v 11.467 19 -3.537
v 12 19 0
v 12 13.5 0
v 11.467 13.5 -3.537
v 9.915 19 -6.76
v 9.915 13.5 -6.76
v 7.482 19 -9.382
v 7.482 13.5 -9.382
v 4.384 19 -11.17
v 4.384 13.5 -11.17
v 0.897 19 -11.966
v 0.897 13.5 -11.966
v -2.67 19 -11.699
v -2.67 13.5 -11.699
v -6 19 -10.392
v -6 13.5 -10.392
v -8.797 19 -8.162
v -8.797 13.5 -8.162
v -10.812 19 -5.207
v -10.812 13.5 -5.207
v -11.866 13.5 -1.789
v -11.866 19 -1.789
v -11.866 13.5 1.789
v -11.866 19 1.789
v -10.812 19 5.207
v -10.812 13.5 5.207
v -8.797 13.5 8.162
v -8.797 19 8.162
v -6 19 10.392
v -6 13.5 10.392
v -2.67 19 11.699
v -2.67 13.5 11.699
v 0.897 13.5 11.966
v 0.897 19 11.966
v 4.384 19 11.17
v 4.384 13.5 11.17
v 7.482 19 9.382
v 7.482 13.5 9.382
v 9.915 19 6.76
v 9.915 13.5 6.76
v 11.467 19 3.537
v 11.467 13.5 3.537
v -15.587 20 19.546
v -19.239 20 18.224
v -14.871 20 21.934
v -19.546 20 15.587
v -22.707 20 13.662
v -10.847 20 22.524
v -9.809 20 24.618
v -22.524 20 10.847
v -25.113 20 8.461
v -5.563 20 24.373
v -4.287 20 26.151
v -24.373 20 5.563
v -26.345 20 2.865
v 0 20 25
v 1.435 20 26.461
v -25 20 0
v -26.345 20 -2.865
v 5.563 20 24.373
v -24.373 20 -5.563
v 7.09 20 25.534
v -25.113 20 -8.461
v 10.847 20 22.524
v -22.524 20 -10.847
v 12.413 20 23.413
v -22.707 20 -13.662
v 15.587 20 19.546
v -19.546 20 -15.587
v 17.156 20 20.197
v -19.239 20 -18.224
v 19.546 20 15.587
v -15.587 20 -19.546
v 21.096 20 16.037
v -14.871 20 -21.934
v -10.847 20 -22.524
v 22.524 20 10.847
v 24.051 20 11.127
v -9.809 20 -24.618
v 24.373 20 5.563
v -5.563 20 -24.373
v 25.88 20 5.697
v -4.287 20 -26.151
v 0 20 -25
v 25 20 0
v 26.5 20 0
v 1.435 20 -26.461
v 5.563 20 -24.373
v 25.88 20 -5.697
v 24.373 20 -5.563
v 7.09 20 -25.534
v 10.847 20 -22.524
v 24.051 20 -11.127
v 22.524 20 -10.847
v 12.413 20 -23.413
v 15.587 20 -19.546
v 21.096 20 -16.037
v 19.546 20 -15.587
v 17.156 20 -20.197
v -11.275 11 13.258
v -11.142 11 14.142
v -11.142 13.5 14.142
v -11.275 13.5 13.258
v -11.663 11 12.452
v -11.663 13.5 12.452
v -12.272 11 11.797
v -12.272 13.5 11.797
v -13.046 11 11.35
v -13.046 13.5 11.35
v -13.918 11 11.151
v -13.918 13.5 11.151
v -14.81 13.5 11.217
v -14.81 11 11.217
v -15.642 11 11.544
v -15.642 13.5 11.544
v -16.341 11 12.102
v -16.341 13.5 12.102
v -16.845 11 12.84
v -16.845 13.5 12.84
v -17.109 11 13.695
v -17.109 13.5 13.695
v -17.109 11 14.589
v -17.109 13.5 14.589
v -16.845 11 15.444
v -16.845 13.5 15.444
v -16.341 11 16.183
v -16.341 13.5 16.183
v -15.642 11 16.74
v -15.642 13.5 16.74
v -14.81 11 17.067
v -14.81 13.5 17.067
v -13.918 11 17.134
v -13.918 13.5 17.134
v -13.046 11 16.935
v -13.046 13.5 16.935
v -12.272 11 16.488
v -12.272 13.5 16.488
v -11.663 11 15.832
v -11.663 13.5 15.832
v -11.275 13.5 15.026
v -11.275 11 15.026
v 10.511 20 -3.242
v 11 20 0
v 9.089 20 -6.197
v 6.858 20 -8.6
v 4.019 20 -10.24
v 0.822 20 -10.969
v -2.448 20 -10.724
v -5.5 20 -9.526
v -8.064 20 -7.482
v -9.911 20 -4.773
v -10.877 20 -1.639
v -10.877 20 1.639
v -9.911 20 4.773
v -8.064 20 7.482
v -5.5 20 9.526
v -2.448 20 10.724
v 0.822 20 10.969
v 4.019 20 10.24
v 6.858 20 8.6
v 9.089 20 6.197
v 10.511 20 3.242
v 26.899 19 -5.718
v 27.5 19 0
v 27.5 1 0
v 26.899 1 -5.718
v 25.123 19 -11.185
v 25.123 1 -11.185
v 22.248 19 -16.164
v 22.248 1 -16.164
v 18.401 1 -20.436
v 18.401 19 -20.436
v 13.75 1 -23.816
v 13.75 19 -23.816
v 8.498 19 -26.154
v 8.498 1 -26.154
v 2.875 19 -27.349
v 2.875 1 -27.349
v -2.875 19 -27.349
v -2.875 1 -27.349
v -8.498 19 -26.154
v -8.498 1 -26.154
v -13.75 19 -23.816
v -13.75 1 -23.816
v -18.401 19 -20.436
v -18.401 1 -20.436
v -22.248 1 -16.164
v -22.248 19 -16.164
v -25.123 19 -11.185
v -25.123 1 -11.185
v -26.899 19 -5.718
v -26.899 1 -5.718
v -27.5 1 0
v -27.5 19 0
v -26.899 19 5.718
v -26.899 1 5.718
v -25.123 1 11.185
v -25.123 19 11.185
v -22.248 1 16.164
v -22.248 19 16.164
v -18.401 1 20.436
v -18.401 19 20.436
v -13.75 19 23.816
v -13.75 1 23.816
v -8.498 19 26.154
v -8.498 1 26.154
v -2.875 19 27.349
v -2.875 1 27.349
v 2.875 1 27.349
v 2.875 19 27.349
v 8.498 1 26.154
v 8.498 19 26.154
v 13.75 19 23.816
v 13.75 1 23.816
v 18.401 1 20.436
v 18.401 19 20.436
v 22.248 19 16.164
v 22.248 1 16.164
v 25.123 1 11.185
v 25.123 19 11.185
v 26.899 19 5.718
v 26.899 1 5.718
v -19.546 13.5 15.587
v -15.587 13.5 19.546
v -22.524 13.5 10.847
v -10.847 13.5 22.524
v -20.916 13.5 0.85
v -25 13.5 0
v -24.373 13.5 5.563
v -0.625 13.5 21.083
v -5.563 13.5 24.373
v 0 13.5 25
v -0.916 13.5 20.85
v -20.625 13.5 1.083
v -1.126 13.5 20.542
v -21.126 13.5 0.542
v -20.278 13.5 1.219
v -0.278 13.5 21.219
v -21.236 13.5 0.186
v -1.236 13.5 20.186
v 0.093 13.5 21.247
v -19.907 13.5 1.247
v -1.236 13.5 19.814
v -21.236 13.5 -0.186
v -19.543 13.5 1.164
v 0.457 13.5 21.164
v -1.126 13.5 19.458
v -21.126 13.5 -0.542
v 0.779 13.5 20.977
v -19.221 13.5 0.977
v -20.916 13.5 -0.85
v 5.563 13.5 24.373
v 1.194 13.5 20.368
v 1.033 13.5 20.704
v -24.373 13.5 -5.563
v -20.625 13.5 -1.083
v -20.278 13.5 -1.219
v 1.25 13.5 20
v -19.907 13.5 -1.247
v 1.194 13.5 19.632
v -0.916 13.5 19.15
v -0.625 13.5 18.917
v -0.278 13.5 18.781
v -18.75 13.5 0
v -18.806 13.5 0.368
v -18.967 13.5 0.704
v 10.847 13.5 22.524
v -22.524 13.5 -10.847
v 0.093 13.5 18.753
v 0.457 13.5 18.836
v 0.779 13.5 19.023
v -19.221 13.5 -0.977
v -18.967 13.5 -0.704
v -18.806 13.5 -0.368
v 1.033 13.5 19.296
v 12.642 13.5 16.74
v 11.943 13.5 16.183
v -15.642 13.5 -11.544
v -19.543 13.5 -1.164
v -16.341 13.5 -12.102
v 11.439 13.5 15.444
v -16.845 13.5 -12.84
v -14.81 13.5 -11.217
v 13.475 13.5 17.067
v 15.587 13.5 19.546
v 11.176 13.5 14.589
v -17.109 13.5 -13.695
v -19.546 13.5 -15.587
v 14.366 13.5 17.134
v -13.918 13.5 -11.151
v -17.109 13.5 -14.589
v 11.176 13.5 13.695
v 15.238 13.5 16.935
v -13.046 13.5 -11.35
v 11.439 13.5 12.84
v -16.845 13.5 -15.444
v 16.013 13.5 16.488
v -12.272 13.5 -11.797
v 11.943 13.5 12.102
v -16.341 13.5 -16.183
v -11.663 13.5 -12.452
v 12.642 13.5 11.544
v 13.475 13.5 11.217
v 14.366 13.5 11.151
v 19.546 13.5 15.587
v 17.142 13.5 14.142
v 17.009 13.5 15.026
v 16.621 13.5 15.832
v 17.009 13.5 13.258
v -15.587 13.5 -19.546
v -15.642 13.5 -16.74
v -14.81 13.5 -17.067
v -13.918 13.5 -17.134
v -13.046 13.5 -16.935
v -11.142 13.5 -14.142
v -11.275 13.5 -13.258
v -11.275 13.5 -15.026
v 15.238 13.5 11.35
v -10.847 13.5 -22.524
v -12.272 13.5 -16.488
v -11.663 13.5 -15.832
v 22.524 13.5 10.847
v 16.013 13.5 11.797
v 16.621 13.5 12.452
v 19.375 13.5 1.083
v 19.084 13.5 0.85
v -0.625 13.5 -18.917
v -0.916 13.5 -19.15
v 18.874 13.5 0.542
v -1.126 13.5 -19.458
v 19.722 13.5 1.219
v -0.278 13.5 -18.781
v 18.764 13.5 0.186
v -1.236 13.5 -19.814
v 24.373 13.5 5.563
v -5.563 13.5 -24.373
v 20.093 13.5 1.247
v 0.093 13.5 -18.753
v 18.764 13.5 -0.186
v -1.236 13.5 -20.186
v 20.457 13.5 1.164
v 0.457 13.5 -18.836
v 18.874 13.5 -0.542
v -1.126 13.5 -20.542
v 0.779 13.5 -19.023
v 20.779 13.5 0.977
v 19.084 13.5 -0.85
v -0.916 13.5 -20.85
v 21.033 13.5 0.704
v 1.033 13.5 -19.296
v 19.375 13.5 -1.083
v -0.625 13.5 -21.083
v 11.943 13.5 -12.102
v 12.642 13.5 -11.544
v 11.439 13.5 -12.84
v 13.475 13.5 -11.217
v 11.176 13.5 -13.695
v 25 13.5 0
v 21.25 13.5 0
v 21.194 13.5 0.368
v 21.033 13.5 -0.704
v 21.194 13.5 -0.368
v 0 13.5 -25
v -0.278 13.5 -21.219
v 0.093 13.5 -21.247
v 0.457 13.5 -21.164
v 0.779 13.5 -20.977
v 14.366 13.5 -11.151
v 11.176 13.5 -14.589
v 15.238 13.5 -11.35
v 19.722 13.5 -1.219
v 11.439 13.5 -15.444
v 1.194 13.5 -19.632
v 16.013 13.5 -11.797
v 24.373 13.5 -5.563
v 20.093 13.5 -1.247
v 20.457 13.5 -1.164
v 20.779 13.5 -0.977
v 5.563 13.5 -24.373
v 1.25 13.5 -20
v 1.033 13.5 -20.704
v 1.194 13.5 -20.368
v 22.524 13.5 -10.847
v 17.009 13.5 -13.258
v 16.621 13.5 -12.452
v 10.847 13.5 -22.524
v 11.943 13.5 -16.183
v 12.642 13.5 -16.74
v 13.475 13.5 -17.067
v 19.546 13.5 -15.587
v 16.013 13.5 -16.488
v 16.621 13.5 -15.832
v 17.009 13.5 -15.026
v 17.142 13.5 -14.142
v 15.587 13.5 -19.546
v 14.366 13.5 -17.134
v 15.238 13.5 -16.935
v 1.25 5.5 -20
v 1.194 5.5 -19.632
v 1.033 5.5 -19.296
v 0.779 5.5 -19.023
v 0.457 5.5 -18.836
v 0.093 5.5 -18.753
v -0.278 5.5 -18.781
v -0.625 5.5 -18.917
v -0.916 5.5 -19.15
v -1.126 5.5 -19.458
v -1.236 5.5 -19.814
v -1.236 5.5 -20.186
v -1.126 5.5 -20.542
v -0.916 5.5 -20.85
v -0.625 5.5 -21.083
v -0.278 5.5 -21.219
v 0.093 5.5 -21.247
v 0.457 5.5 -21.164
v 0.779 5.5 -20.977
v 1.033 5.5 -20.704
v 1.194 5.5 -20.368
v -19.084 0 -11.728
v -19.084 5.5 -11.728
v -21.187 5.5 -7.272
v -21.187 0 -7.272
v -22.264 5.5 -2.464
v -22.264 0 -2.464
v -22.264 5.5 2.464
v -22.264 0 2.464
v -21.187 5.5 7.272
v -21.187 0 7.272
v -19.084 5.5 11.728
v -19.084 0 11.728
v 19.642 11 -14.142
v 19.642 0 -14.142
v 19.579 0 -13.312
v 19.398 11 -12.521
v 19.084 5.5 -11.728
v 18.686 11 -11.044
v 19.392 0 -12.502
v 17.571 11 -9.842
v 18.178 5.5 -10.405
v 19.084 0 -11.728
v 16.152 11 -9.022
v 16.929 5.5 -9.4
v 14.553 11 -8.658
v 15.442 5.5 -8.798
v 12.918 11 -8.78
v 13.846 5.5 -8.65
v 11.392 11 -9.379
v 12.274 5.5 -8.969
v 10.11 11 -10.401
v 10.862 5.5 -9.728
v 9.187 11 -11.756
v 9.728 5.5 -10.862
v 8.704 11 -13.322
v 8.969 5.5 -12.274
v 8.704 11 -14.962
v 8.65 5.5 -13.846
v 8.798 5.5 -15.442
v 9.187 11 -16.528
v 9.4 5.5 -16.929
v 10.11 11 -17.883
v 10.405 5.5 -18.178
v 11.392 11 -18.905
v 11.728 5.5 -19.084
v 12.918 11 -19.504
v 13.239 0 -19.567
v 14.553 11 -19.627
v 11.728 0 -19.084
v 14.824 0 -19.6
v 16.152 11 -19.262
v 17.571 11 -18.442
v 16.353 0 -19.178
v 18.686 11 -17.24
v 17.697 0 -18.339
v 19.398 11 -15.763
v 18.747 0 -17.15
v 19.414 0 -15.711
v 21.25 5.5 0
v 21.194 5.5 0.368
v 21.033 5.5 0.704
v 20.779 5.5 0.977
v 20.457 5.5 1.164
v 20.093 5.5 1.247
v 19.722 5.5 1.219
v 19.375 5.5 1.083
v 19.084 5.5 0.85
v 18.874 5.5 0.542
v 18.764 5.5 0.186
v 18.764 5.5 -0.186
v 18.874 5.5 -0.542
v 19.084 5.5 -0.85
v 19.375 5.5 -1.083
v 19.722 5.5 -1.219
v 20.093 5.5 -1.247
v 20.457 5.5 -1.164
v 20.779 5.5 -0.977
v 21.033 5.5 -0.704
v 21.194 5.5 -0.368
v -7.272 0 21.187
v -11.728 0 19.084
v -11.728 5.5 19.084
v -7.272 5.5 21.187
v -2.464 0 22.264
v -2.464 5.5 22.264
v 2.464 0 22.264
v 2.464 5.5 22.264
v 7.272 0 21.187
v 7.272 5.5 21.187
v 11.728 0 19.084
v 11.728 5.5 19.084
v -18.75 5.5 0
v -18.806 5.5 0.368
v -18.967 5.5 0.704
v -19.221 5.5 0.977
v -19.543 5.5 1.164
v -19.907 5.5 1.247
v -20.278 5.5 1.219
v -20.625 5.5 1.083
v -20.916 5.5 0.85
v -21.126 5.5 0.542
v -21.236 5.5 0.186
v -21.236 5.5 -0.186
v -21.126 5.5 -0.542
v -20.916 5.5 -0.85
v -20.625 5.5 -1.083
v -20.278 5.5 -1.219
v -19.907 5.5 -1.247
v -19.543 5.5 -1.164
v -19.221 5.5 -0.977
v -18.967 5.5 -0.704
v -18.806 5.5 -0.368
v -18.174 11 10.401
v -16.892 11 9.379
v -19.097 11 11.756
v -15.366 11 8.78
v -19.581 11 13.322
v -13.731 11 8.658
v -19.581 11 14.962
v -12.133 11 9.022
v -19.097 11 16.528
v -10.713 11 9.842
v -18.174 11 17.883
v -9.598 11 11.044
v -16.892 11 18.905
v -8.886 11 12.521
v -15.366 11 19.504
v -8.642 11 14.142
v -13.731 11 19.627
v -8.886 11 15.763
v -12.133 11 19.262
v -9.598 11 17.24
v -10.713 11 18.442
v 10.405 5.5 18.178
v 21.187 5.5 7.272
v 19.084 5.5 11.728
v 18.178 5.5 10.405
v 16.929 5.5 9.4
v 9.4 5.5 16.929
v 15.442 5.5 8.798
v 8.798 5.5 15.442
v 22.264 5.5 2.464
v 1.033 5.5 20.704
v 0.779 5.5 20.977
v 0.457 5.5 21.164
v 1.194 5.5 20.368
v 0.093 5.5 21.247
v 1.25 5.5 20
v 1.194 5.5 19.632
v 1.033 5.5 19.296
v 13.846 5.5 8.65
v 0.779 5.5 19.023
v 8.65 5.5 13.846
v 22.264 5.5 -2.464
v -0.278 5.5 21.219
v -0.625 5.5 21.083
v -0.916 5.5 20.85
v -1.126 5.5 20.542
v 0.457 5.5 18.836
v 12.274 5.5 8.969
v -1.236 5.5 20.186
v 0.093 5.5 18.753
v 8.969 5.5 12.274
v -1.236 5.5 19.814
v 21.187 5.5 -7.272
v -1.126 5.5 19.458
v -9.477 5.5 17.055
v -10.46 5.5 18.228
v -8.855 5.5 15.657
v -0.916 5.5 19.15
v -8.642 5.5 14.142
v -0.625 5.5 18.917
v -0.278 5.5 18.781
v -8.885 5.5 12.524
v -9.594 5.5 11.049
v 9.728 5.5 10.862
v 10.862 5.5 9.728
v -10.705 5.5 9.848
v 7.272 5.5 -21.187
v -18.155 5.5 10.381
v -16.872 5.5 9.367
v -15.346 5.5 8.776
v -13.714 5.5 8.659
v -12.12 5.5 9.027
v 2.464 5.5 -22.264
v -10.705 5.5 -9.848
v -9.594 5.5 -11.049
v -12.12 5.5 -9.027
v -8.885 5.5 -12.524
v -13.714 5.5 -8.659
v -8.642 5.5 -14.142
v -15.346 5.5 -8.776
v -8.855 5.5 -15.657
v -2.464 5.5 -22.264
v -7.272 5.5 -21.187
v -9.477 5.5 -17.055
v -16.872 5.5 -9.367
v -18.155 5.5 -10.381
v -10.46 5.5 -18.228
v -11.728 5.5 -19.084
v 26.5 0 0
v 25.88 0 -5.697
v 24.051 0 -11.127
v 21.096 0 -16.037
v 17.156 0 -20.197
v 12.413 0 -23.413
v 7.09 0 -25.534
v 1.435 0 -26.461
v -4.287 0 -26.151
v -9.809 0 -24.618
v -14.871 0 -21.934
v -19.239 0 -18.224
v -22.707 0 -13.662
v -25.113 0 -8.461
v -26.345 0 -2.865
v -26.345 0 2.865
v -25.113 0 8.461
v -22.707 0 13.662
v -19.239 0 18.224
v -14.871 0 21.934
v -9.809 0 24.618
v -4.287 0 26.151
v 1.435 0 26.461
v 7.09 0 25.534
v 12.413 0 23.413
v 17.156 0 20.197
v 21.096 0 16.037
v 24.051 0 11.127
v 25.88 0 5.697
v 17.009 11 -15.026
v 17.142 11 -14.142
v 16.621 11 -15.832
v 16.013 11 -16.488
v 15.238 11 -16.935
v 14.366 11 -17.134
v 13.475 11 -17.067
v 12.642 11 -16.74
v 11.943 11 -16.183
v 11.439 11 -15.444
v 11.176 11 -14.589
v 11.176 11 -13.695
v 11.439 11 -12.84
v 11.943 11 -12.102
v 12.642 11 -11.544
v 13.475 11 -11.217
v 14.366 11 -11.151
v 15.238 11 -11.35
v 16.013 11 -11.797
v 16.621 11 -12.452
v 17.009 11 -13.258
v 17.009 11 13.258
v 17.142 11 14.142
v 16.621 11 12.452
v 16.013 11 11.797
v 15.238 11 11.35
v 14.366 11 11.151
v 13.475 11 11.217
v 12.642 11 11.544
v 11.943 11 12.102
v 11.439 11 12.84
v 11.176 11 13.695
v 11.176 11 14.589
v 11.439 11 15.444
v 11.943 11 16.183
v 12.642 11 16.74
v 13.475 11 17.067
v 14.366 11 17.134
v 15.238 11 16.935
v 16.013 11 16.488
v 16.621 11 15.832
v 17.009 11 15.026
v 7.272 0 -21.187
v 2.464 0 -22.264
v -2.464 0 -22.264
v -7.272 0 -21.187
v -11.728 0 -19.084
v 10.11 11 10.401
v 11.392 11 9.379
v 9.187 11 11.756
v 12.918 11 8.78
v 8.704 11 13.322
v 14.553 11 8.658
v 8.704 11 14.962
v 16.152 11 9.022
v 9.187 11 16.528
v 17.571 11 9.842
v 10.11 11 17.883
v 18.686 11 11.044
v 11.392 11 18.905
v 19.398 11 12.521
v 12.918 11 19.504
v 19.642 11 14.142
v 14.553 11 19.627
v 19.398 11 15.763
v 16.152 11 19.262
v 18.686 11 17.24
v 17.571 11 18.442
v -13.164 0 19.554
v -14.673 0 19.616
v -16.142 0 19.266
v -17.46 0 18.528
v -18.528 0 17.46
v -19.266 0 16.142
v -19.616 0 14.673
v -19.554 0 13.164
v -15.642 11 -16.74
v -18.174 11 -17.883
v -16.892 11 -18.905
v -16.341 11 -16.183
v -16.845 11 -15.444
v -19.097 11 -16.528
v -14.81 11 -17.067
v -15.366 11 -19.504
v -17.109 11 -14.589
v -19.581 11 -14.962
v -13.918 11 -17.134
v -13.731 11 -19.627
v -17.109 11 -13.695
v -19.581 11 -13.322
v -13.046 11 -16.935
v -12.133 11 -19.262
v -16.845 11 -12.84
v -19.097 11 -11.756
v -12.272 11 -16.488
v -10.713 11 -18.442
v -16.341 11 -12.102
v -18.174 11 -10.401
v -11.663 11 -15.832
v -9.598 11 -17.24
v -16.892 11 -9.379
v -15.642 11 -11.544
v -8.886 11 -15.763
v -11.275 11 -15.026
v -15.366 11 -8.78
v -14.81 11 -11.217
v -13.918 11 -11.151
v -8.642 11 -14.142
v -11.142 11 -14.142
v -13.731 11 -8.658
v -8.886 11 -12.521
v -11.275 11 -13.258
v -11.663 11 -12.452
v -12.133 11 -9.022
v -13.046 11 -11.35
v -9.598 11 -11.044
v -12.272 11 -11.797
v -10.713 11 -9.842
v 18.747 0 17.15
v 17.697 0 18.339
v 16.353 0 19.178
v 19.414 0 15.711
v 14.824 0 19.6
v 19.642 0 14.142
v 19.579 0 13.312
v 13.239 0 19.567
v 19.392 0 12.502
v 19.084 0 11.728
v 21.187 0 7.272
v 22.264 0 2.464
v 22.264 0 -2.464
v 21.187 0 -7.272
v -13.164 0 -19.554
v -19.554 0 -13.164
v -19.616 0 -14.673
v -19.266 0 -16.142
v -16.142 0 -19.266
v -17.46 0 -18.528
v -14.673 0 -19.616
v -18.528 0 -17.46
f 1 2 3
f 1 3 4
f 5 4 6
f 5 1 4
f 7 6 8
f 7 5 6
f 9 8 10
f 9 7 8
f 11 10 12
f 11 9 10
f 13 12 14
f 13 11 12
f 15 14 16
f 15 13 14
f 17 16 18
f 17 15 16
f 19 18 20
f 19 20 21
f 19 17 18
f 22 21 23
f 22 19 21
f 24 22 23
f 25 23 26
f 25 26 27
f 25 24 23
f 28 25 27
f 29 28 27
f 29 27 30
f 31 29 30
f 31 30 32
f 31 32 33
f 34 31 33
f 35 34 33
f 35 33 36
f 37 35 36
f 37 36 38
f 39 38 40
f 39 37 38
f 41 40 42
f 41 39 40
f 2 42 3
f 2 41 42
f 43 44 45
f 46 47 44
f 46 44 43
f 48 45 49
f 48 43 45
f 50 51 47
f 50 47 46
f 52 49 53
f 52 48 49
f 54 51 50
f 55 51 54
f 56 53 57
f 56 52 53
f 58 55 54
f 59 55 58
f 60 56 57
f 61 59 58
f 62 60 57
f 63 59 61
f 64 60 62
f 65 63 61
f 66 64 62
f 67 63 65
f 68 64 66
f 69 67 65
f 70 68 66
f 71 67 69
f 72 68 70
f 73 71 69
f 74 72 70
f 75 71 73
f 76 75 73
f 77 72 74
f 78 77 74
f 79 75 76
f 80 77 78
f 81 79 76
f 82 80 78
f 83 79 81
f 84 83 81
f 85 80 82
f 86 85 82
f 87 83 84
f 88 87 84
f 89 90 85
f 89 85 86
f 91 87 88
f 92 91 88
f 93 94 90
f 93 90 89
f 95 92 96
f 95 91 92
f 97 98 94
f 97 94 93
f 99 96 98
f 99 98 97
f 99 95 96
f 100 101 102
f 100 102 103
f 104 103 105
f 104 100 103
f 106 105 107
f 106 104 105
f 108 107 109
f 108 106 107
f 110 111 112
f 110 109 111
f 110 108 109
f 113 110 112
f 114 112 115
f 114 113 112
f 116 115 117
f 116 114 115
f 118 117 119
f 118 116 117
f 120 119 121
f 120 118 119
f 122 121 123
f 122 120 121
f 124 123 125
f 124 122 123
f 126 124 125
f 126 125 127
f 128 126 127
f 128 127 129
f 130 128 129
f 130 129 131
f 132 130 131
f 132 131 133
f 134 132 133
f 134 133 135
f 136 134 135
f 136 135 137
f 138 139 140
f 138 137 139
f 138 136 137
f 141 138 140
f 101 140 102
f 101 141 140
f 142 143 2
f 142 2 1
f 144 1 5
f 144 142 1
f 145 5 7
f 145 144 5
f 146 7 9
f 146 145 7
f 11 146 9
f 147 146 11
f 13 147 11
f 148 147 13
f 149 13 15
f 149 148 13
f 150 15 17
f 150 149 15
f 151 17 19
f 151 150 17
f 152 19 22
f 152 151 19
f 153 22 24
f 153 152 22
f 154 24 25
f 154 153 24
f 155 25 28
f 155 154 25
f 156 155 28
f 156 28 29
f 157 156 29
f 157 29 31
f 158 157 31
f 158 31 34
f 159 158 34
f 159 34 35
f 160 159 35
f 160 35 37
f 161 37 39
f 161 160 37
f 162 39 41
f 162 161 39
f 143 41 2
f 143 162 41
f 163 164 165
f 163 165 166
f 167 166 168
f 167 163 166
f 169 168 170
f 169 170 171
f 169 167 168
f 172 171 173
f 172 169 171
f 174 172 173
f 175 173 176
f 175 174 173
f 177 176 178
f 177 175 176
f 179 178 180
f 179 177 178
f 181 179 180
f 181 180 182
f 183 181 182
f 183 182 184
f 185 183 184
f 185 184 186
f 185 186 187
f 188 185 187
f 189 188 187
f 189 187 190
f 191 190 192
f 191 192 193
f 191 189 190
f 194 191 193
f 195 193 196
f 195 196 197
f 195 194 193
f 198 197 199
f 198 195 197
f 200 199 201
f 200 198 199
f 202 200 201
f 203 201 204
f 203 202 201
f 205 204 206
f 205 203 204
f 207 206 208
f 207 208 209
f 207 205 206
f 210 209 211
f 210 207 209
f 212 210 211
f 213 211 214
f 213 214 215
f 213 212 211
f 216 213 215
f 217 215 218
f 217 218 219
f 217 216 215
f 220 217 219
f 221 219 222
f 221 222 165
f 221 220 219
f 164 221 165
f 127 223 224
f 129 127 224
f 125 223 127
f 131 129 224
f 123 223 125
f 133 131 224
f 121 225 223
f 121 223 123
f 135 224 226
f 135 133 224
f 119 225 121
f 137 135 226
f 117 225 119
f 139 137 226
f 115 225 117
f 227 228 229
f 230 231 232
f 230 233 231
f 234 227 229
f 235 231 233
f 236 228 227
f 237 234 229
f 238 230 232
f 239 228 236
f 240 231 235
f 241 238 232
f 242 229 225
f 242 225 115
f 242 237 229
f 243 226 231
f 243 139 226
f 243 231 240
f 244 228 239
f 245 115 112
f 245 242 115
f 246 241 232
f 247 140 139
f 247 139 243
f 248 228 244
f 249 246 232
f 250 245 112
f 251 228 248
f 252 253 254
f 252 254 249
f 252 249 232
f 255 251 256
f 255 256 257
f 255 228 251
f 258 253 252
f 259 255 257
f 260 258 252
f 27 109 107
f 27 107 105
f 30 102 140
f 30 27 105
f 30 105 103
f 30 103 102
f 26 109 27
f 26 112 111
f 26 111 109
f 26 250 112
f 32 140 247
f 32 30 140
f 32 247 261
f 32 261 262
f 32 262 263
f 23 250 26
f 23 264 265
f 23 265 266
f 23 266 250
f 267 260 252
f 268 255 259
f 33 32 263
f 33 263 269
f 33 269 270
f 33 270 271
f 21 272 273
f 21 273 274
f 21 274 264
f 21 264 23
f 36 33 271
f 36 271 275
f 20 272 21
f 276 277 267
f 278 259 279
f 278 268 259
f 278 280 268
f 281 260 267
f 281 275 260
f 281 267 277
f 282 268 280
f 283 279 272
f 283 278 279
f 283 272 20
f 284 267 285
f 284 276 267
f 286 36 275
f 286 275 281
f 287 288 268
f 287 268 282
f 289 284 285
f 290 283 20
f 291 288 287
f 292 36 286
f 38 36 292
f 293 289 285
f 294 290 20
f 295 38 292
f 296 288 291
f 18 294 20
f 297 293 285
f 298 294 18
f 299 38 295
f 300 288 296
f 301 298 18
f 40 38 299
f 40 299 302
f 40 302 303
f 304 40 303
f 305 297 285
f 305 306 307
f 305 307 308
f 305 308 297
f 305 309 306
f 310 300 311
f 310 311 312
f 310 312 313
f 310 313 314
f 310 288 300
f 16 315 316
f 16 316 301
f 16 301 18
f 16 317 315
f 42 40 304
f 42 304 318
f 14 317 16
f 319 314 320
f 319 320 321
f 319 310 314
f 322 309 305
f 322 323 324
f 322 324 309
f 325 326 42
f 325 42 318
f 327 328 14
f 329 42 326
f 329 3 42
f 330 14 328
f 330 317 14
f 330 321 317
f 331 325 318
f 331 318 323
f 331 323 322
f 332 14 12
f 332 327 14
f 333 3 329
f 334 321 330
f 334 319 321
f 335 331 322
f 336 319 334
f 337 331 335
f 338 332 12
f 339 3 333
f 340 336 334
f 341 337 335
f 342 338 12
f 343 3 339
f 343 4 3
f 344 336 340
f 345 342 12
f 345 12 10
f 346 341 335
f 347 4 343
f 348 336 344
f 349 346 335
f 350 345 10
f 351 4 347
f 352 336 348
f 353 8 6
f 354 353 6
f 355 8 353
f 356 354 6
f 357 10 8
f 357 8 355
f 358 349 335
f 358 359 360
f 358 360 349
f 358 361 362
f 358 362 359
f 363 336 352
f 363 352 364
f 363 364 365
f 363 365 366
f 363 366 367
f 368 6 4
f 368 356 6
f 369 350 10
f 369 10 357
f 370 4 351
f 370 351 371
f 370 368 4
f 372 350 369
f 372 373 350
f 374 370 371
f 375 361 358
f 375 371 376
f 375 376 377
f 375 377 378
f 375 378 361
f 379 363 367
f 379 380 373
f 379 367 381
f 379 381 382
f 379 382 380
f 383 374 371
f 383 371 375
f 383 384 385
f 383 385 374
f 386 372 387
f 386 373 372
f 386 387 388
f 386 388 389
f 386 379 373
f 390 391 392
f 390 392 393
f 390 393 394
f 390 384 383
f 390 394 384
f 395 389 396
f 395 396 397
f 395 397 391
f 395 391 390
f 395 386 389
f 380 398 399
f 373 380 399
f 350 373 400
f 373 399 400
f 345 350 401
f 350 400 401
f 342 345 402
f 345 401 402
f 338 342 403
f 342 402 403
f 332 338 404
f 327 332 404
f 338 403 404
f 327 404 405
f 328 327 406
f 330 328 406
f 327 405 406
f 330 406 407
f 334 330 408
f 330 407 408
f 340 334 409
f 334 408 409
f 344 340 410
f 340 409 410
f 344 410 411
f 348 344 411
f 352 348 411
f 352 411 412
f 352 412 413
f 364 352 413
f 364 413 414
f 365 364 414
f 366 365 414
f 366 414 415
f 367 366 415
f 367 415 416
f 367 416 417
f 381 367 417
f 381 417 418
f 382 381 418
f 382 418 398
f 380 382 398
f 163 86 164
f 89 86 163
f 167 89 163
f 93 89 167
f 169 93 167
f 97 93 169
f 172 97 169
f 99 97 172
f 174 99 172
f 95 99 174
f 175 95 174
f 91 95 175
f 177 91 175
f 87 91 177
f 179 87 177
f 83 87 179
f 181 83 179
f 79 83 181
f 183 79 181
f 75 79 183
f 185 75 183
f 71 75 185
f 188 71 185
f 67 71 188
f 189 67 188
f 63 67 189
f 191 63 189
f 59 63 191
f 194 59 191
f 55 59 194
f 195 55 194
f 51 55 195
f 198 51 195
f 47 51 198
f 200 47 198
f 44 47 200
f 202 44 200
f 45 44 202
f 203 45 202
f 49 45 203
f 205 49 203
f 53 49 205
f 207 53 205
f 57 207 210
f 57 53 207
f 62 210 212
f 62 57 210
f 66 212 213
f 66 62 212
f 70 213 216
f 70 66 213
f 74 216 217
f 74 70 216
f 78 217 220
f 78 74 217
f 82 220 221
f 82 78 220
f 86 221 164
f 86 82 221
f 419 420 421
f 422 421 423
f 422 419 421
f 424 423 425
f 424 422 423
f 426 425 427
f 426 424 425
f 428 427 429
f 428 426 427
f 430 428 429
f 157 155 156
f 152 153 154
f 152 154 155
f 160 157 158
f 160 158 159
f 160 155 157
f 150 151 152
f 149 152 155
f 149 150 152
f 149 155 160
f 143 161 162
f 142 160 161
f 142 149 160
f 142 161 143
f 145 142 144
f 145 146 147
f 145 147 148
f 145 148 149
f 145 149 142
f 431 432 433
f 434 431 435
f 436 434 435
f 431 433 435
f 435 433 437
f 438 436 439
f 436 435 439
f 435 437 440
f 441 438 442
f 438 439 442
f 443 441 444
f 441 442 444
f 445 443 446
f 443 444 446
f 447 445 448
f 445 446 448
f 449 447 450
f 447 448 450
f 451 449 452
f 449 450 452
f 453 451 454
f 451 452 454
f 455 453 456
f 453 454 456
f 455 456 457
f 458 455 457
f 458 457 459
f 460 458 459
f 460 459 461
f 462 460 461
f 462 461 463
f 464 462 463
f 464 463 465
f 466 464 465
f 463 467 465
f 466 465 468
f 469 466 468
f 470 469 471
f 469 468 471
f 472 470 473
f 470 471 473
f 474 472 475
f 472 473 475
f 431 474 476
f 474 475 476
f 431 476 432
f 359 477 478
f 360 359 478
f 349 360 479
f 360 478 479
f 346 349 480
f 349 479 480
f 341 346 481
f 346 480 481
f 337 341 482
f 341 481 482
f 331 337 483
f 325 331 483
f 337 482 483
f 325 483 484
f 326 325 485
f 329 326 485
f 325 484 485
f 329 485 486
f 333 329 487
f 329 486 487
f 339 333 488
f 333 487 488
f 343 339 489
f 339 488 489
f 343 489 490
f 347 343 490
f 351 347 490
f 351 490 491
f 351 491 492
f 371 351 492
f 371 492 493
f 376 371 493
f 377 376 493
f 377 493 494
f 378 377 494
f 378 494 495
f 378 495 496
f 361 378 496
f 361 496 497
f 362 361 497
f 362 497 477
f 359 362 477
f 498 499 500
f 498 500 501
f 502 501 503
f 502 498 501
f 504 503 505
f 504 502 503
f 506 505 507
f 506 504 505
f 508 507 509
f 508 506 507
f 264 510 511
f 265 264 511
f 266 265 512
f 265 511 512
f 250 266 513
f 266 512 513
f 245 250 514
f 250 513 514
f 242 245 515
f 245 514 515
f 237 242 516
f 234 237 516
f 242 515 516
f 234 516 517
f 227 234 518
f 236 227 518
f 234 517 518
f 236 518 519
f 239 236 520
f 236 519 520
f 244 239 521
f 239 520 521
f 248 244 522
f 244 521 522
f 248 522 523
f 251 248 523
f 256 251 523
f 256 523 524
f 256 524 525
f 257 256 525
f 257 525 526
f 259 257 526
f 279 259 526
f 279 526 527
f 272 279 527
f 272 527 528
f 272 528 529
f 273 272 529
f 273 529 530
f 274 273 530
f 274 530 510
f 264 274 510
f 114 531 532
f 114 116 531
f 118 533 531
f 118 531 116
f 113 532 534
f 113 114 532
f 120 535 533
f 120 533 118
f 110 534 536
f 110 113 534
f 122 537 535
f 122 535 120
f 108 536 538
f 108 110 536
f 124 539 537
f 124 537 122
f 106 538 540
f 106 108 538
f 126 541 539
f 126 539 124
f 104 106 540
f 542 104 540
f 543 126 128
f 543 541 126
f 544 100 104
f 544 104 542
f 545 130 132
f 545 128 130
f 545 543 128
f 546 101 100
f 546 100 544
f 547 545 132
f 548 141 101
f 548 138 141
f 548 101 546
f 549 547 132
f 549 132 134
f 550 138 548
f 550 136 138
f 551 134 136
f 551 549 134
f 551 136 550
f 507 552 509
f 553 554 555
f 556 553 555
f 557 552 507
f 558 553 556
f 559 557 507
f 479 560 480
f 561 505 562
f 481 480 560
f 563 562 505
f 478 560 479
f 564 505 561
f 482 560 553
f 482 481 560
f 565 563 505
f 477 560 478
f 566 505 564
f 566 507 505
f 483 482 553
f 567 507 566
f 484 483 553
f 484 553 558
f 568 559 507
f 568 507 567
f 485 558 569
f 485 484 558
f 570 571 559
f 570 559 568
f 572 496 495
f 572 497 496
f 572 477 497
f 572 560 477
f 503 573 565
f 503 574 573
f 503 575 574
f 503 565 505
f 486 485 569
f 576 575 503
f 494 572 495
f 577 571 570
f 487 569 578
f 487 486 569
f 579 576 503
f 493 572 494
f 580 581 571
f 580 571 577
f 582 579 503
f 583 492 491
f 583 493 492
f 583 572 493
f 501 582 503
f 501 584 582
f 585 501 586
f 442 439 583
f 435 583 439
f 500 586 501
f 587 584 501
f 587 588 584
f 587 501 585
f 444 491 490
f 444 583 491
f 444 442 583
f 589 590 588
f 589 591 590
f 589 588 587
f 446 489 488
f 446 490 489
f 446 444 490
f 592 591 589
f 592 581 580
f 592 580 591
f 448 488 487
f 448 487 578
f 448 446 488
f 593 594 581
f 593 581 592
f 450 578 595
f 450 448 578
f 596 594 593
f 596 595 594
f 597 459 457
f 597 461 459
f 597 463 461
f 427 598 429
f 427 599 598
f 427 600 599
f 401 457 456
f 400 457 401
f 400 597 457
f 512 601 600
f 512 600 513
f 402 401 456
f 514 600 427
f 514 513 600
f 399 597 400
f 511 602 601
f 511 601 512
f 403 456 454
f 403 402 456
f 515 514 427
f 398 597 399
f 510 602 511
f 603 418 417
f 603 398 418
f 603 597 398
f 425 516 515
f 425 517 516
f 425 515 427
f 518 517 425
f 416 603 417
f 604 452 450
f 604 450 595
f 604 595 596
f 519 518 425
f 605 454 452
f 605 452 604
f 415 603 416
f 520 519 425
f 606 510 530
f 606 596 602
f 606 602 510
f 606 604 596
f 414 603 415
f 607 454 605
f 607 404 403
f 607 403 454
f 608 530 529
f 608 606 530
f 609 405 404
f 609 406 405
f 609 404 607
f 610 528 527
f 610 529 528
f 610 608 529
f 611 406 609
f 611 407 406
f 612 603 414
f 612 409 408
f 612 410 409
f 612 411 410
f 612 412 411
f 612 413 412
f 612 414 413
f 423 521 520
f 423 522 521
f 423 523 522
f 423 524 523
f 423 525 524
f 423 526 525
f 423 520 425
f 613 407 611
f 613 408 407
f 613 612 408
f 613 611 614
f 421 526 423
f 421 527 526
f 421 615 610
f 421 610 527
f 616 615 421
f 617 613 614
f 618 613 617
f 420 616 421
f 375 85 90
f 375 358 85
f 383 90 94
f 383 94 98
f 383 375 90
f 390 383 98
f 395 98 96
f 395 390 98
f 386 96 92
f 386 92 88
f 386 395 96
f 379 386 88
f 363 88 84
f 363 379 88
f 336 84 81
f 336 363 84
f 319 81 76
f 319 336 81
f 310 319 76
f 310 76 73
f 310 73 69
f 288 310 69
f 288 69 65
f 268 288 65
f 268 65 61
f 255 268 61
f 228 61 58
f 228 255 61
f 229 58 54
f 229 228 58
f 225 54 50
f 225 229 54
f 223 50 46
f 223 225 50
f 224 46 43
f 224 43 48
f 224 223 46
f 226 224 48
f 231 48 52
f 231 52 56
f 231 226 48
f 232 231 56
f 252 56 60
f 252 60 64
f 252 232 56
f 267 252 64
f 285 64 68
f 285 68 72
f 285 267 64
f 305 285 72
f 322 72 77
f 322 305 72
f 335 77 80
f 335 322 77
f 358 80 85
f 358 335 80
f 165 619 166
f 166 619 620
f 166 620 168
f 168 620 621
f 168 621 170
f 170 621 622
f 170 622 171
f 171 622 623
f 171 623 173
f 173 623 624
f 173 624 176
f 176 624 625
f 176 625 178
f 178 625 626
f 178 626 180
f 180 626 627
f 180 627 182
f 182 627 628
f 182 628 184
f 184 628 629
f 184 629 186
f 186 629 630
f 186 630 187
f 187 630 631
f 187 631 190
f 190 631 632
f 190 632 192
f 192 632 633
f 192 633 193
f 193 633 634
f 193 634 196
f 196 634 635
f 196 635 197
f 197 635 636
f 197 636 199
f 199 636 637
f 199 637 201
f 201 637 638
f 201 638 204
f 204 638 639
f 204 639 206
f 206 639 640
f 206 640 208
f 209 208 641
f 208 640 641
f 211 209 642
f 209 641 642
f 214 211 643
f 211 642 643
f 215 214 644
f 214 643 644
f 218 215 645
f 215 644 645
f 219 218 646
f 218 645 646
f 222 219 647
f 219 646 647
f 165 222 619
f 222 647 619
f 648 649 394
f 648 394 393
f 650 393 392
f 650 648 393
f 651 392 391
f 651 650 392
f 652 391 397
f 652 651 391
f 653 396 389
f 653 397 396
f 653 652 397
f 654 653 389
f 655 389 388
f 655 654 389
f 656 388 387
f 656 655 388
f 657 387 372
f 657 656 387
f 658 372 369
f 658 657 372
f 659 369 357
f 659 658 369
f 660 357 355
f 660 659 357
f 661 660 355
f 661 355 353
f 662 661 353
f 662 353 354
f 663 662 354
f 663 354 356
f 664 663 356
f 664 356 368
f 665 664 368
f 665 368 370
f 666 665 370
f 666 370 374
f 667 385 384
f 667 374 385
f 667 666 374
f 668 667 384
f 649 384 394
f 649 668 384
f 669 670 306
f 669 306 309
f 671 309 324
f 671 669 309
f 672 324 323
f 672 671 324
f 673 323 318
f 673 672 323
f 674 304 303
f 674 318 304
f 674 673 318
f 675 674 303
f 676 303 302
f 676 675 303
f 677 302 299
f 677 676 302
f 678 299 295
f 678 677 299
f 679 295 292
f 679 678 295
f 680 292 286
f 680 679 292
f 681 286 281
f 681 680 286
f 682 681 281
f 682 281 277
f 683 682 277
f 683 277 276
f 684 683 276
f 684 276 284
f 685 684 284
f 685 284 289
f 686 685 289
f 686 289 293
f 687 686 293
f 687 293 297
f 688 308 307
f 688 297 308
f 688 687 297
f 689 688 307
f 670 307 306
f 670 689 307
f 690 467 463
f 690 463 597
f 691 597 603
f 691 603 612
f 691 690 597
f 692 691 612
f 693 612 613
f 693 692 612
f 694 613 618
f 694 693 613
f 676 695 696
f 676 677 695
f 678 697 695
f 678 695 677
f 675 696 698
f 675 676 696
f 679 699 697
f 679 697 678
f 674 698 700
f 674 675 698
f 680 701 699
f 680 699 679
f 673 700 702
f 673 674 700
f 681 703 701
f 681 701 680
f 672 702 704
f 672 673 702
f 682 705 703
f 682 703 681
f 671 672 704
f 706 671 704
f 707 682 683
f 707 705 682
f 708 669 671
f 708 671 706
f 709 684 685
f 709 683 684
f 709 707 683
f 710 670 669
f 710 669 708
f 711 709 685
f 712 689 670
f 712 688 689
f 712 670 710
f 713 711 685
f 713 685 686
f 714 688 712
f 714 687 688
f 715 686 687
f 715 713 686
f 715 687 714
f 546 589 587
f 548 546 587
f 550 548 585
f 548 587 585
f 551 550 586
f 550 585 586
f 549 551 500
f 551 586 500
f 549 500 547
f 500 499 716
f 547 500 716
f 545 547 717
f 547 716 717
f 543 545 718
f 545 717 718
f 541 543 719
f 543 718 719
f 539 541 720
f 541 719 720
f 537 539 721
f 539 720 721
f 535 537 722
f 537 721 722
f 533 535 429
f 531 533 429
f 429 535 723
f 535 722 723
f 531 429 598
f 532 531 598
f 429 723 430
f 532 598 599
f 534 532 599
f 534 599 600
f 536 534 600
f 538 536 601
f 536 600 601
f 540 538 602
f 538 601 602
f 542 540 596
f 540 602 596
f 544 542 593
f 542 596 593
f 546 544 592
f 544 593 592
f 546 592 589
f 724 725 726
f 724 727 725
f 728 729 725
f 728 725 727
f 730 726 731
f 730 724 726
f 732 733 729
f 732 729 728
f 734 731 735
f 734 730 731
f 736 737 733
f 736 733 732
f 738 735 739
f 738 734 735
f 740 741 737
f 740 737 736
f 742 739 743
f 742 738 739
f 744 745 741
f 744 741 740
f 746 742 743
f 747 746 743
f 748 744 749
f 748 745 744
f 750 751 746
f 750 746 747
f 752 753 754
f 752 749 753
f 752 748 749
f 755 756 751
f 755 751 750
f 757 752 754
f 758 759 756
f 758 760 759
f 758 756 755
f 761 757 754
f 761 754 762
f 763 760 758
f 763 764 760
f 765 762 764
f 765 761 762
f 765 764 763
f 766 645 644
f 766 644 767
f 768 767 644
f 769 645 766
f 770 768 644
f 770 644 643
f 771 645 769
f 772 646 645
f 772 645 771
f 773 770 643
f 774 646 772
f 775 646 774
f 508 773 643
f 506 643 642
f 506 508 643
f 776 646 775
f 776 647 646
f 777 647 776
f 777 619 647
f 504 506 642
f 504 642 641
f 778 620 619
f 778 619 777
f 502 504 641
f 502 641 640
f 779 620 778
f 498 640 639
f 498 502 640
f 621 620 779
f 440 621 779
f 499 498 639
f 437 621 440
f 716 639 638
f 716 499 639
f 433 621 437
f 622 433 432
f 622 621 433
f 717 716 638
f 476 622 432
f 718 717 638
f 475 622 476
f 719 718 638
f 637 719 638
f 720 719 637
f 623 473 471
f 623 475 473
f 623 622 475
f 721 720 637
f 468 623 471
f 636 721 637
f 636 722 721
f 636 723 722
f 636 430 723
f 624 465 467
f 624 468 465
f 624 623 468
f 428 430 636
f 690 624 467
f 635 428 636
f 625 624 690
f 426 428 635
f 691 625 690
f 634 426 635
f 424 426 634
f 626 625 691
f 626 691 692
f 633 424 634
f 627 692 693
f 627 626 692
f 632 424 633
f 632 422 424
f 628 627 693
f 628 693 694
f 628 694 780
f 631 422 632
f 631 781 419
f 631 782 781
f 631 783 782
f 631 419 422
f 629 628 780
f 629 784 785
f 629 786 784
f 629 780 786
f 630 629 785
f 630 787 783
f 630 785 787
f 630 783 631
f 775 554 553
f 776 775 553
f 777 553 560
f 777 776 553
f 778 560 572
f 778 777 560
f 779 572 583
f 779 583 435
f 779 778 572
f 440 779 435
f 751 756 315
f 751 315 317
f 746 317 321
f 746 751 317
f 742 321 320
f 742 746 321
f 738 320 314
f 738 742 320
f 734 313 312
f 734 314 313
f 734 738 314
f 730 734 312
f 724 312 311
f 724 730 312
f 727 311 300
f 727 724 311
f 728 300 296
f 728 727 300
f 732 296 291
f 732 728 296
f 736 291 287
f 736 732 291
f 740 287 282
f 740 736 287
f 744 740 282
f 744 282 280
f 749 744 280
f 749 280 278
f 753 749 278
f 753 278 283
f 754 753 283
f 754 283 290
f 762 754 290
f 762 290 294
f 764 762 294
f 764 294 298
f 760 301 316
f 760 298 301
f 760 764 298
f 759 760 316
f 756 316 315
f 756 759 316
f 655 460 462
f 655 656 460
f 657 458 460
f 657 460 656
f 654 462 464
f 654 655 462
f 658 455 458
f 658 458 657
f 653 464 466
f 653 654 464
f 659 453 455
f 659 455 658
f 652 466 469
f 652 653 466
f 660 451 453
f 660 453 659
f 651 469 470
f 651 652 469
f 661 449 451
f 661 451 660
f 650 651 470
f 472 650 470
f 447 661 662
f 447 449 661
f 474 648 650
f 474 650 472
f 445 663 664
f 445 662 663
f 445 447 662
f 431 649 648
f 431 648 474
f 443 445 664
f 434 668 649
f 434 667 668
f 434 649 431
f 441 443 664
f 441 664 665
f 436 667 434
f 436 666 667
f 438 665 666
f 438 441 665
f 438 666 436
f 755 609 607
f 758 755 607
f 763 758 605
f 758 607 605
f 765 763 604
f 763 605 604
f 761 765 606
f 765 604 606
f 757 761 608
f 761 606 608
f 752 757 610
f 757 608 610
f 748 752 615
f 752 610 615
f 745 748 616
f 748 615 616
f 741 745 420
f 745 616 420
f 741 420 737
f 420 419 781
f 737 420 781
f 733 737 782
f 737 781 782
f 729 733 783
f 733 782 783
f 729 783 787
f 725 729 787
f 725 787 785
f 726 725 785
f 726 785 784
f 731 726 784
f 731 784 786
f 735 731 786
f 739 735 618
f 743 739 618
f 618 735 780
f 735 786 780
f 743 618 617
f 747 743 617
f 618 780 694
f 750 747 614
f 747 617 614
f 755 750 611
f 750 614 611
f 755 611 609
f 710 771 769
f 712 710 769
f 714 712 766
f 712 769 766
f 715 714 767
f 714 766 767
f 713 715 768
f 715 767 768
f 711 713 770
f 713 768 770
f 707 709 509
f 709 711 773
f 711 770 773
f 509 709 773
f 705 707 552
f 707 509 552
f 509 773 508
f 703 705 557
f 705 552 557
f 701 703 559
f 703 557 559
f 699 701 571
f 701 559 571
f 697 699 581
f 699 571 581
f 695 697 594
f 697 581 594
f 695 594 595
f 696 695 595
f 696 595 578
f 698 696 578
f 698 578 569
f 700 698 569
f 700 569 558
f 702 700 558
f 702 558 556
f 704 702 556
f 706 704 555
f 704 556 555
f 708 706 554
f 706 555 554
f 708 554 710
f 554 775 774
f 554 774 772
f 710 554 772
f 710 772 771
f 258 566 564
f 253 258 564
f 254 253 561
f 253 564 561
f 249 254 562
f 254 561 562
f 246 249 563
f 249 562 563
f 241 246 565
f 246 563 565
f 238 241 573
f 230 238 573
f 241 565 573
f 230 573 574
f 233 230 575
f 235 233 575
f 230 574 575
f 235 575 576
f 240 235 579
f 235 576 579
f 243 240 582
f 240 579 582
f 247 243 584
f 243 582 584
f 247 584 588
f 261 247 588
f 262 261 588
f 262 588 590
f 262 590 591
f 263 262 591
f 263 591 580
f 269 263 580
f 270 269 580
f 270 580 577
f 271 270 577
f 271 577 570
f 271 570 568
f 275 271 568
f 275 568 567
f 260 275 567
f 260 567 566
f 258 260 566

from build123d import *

# Parameters (mm, degrees)
SKETCH2_R               = 3
CUT_EXTRUDE2_DEPTH      = 21
CUT_EXTRUDE2_DEPTH_BACK = 1
SKETCH3_R               = 5.5
CUT_EXTRUDE3_DEPTH      = 11
CUT_EXTRUDE4_REACH      = 16.5
SKETCH4_R               = 1.25
CHAMFER1_SIZE           = 1


with BuildPart() as part:
    # Sketch1 → Revolve1 (revolve)
    with BuildSketch(Plane.XY):
        Polygon((27.5, 0), (27.5, 20), (25, 20), (25, 13.5), (12, 13.5), (12, 20), (0, 20), (0, 5.5), (22.4, 5.5), (22.4, 0), align=None)
    revolve(axis=Axis((0, -626.687351978, 0), (0, 1, 0)))

    # Sketch2 → Cut-Extrude2 (cut, two sides)
    with BuildSketch(Plane(origin=(0, 0, 0), x_dir=(1, 0, 0), z_dir=(0, 1, 0))) as cut_extrude2_sk:
        with Locations((-14.142135624, 14.142135624)):
            Circle(SKETCH2_R)
        with Locations((14.142135624, 14.142135624)):
            Circle(SKETCH2_R)
        with Locations((14.142135624, -14.142135624)):
            Circle(SKETCH2_R)
        with Locations((-14.142135624, -14.142135624)):
            Circle(SKETCH2_R)
    extrude(amount=CUT_EXTRUDE2_DEPTH, mode=Mode.SUBTRACT)
    extrude(cut_extrude2_sk.sketch, amount=-CUT_EXTRUDE2_DEPTH_BACK, mode=Mode.SUBTRACT)

    # Sketch3 → Cut-Extrude3 (cut)
    with BuildSketch(Plane.XZ):
        with Locations((-14.142135624, 14.142135624)):
            Circle(SKETCH3_R)
        with Locations((14.142135624, 14.142135624)):
            Circle(SKETCH3_R)
        with Locations((14.142135624, -14.142135624)):
            Circle(SKETCH3_R)
        with Locations((-14.142135624, -14.142135624)):
            Circle(SKETCH3_R)
    extrude(amount=-CUT_EXTRUDE3_DEPTH, mode=Mode.SUBTRACT)

    # Sketch4 → Cut-Extrude4 (cut, up to next)
    with BuildSketch(Plane.XZ.offset(-5.5), mode=Mode.PRIVATE) as cut_extrude4_sk1:
        with Locations((0, 20)):
            Circle(SKETCH4_R)
    cut_extrude4_tool1 = extrude(cut_extrude4_sk1.sketch, amount=-CUT_EXTRUDE4_REACH, mode=Mode.PRIVATE) & part.part
    add(cut_extrude4_tool1.solids().sort_by_distance((0, 5.5, 20))[0], mode=Mode.SUBTRACT)
    # Sketch4 → Cut-Extrude4 (cut, up to next)
    with BuildSketch(Plane.XZ.offset(-5.5), mode=Mode.PRIVATE) as cut_extrude4_sk2:
        with Locations((-20, 0)):
            Circle(SKETCH4_R)
    cut_extrude4_tool2 = extrude(cut_extrude4_sk2.sketch, amount=-CUT_EXTRUDE4_REACH, mode=Mode.PRIVATE) & part.part
    add(cut_extrude4_tool2.solids().sort_by_distance((-20, 5.5, 0))[0], mode=Mode.SUBTRACT)
    # Sketch4 → Cut-Extrude4 (cut, up to next)
    with BuildSketch(Plane.XZ.offset(-5.5), mode=Mode.PRIVATE) as cut_extrude4_sk3:
        with Locations((0, -20)):
            Circle(SKETCH4_R)
    cut_extrude4_tool3 = extrude(cut_extrude4_sk3.sketch, amount=-CUT_EXTRUDE4_REACH, mode=Mode.PRIVATE) & part.part
    add(cut_extrude4_tool3.solids().sort_by_distance((0, 5.5, -20))[0], mode=Mode.SUBTRACT)
    # Sketch4 → Cut-Extrude4 (cut, up to next)
    with BuildSketch(Plane.XZ.offset(-5.5), mode=Mode.PRIVATE) as cut_extrude4_sk4:
        with Locations((20, 0)):
            Circle(SKETCH4_R)
    cut_extrude4_tool4 = extrude(cut_extrude4_sk4.sketch, amount=-CUT_EXTRUDE4_REACH, mode=Mode.PRIVATE) & part.part
    add(cut_extrude4_tool4.solids().sort_by_distance((20, 5.5, 0))[0], mode=Mode.SUBTRACT)

    # Chamfer1
    chamfer1_edges = [part.edges().sort_by_distance(p)[0] for p in [
        (-12, 20, 0),
        (-27.5, 0, 0),
        (-27.5, 20, 0),
    ]]
    chamfer(chamfer1_edges, length=CHAMFER1_SIZE)


solid = part.part
